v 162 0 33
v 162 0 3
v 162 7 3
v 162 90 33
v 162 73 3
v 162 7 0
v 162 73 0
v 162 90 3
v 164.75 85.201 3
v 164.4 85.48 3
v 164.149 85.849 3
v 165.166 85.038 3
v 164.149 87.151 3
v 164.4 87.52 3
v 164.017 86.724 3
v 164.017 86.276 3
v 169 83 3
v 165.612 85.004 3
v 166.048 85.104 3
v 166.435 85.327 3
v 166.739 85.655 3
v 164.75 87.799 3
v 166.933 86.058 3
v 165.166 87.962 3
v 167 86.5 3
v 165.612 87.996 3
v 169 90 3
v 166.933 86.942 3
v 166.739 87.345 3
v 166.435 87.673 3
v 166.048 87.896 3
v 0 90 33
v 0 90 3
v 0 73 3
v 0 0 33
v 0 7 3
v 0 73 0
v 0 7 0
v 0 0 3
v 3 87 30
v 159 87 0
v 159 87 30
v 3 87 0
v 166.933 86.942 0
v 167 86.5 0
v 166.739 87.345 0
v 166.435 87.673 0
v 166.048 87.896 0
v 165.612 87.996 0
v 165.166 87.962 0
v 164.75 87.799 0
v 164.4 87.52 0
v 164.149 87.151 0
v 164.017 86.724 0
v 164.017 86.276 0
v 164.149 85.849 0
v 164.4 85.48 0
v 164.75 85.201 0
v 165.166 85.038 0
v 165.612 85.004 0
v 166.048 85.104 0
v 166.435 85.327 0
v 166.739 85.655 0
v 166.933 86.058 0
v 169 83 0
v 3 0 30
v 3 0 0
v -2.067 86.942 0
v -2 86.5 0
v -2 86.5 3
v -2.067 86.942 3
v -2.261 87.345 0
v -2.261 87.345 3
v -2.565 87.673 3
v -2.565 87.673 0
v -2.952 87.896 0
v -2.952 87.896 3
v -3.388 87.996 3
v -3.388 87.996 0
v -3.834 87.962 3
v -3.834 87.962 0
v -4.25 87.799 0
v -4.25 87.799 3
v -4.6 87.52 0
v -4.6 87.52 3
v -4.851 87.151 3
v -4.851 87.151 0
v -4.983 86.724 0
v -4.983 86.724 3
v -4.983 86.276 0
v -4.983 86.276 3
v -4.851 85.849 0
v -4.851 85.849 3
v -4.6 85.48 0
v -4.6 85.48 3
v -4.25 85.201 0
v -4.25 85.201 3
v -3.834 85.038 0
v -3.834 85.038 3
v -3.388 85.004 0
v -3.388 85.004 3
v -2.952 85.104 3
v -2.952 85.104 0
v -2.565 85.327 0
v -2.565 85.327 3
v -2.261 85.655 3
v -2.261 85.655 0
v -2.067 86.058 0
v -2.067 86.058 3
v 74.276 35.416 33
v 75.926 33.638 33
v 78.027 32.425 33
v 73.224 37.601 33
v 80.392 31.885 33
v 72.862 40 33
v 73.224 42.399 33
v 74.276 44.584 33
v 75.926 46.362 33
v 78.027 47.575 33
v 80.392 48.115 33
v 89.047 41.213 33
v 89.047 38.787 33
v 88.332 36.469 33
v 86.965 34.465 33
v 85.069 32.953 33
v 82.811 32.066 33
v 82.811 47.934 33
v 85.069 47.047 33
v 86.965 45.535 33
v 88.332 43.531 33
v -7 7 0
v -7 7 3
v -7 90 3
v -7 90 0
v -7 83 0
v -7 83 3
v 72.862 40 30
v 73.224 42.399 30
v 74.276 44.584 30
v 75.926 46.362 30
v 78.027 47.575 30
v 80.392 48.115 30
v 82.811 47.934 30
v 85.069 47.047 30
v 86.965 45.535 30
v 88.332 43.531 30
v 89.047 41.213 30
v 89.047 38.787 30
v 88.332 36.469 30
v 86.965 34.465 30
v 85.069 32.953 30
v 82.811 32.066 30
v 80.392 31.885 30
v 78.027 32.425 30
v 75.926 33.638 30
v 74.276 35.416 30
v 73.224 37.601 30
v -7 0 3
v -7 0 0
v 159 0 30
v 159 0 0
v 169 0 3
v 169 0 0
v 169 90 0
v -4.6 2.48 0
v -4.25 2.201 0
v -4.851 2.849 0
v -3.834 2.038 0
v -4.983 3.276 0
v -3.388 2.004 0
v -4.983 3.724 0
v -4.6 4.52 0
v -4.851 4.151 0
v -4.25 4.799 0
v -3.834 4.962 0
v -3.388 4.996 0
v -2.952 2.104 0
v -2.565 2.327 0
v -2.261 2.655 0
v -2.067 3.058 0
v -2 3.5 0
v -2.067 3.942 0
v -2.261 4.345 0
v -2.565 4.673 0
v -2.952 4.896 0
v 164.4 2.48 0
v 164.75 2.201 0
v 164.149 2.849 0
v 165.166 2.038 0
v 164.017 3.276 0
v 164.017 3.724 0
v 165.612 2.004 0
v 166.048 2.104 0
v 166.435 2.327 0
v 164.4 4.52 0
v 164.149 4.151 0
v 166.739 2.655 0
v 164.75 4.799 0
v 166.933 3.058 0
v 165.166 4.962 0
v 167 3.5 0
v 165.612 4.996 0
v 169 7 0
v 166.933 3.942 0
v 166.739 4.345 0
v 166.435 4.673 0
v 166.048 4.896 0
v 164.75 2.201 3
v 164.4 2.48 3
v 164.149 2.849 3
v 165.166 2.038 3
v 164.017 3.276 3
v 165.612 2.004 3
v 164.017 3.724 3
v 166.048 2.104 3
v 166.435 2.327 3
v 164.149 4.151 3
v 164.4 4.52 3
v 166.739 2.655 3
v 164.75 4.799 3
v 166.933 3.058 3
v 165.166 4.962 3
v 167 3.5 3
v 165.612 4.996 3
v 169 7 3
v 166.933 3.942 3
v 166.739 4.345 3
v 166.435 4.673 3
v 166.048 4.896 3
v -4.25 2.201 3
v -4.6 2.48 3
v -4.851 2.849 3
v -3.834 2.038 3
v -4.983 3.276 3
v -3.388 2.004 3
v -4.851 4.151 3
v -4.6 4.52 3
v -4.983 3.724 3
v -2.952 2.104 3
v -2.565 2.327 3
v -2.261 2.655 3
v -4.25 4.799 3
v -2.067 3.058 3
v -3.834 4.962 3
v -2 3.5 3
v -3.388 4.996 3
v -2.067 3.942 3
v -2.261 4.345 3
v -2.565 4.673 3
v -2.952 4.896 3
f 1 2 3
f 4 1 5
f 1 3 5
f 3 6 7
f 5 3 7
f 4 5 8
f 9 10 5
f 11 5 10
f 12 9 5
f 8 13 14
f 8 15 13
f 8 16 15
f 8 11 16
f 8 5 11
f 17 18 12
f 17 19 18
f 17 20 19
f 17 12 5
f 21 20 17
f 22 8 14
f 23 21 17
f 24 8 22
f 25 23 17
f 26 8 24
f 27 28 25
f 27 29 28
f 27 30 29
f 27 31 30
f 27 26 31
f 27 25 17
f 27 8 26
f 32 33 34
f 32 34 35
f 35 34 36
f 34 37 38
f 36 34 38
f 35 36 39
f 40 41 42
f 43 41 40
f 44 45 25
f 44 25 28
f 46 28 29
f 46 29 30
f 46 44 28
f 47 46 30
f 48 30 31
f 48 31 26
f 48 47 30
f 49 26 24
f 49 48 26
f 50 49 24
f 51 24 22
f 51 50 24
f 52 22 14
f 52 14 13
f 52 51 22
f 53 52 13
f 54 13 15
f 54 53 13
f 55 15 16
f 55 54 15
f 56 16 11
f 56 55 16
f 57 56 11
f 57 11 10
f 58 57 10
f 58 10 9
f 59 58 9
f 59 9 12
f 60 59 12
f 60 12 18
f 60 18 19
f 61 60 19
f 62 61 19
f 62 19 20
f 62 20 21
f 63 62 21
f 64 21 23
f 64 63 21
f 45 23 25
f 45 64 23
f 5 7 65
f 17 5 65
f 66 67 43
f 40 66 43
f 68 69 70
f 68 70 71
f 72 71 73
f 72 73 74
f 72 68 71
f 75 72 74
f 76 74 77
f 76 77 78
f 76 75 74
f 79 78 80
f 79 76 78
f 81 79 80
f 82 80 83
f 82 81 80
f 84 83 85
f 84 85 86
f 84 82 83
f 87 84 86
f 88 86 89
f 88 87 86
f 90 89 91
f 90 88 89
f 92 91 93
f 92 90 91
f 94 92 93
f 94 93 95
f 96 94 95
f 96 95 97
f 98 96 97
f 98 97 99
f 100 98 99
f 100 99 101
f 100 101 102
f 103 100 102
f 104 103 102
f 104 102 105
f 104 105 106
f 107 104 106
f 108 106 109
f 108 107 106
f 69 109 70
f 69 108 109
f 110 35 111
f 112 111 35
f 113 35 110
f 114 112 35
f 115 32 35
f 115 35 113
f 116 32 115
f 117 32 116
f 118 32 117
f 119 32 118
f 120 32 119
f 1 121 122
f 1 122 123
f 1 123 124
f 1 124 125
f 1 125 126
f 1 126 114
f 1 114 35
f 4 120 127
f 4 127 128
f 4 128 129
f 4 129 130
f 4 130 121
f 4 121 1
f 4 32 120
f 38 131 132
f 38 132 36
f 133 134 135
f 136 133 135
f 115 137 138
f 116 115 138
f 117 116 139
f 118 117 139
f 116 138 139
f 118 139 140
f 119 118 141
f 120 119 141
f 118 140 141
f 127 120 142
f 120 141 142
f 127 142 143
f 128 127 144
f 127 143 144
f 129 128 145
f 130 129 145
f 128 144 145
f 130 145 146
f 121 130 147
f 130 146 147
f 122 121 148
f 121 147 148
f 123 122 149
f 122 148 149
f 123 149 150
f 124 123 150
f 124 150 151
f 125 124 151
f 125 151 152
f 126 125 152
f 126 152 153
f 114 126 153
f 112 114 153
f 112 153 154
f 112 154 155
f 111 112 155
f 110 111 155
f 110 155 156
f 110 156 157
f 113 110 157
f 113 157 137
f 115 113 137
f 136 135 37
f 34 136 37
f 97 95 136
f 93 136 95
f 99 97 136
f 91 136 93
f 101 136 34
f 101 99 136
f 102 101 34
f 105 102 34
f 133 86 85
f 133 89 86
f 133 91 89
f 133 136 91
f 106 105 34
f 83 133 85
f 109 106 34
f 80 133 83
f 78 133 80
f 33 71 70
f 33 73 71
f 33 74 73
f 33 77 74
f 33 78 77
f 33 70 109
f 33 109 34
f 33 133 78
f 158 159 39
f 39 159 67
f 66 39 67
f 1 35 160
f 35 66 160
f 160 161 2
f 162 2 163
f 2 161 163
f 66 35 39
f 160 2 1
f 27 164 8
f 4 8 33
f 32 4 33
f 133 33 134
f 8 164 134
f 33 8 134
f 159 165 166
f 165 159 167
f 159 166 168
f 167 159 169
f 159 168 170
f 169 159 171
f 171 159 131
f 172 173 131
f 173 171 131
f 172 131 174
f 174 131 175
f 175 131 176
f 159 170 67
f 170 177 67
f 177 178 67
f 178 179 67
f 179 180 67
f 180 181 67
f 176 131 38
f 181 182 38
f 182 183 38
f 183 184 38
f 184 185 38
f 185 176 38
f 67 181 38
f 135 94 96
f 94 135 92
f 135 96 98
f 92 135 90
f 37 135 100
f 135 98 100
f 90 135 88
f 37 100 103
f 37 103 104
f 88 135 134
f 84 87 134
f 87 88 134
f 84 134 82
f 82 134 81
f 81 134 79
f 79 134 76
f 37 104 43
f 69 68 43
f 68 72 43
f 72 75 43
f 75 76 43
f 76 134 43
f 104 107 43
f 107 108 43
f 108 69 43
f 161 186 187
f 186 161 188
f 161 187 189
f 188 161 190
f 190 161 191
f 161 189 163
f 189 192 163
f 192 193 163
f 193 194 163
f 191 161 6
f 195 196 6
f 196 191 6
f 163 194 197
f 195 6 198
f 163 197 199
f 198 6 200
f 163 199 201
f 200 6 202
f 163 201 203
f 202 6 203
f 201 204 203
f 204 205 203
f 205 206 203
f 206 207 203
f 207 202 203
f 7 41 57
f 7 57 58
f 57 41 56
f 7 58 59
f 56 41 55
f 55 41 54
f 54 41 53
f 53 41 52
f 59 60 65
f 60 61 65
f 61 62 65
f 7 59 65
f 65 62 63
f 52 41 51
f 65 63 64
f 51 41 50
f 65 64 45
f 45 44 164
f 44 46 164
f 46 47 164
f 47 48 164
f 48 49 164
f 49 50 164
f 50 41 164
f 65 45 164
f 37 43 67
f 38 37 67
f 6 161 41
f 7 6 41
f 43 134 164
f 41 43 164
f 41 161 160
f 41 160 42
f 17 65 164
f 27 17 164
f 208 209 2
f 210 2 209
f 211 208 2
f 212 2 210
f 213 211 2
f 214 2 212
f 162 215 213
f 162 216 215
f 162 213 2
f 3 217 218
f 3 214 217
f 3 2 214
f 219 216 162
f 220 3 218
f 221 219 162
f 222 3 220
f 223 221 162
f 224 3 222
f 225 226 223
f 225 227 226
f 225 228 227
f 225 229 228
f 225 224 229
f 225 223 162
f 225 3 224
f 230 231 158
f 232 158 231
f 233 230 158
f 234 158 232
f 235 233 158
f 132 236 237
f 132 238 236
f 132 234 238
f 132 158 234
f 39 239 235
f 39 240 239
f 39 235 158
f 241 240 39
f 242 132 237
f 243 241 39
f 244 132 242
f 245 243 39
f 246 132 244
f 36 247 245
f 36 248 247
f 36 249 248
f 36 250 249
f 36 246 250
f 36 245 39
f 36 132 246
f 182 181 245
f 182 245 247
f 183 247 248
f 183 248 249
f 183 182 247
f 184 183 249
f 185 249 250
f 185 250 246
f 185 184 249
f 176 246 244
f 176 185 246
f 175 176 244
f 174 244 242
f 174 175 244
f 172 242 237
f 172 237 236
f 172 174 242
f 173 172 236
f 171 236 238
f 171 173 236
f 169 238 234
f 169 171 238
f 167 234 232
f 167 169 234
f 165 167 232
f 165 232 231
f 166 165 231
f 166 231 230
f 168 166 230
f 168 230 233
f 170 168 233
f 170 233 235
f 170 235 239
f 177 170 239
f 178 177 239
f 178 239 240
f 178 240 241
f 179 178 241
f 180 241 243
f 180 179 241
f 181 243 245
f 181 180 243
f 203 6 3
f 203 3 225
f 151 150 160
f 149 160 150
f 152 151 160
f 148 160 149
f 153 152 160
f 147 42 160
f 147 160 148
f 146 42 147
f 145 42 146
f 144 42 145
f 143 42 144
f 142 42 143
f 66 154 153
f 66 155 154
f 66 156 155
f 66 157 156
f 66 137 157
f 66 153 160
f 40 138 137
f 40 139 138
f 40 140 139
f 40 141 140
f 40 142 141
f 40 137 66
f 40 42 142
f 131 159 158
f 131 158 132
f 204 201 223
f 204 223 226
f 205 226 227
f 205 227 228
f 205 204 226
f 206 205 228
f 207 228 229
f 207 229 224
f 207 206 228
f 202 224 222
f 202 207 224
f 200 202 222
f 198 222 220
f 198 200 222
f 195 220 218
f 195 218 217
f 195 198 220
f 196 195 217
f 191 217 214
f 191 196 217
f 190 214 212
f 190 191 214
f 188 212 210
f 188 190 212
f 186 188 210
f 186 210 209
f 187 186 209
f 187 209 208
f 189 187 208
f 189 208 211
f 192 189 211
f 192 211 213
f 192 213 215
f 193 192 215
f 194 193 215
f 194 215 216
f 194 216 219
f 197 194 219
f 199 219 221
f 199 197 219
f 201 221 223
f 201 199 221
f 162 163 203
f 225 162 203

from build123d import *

# Parameters (mm, degrees)
BOSS_EXTRUDE1_DEPTH = 33
SKETCH1_4_W         = 7
SKETCH1_4_H         = 7
SKETCH1_4_R         = 1.5
BOSS_EXTRUDE2_DEPTH = 3
SKETCH3_W           = 156
SKETCH3_H           = 87
SKETCH3_R           = 8.137703122
CUT_EXTRUDE1_DEPTH  = 30
SKETCH3_2_R         = 8.137703122
CUT_EXTRUDE2_DEPTH  = 33


with BuildPart() as part:
    # Sketch1 → Boss-Extrude1 (new body)
    with BuildSketch(Plane.XY):
        Polygon((0, 7), (0, 0), (162, 0), (162, 7), (162, 73), (162, 83), (162, 90), (0, 90), (0, 83), (0, 73), align=None)
    extrude(amount=BOSS_EXTRUDE1_DEPTH)

    # Sketch1<4> → Boss-Extrude2 (add)
    # profile 1 of 4: a face of its own
    with BuildSketch(Plane.XY):
        with Locations((-3.5, 3.5)):
            Rectangle(SKETCH1_4_W, SKETCH1_4_H)
        with Locations((-3.5, 3.5)):
            Circle(SKETCH1_4_R, mode=Mode.SUBTRACT)
    # profile 2 of 4: a face of its own
    with BuildSketch(Plane.XY):
        with Locations((165.5, 3.5)):
            Rectangle(SKETCH1_4_W, SKETCH1_4_H)
        with Locations((165.5, 3.5)):
            Circle(SKETCH1_4_R, mode=Mode.SUBTRACT)
    # profile 3 of 4: a face of its own
    with BuildSketch(Plane.XY):
        Polygon((-7, 83), (0, 73), (0, 90), (-7, 90), align=None)
        with Locations((-3.5, 86.5)):
            Circle(SKETCH1_4_R, mode=Mode.SUBTRACT)
    # profile 4 of 4: a face of its own
    with BuildSketch(Plane.XY):
        Polygon((162, 90), (162, 73), (169, 83), (169, 90), align=None)
        with Locations((165.5, 86.5)):
            Circle(SKETCH1_4_R, mode=Mode.SUBTRACT)
    extrude(amount=BOSS_EXTRUDE2_DEPTH)

    # Sketch3 → Cut-Extrude1 (cut)
    with BuildSketch(Plane(origin=(0, 0, 0), x_dir=(-1, 0, 0), z_dir=(0, 0, -1))):
        with Locations((-81, 43.5)):
            Rectangle(SKETCH3_W, SKETCH3_H)
        with Locations((-81, 40)):
            Circle(SKETCH3_R, mode=Mode.SUBTRACT)
    extrude(amount=-CUT_EXTRUDE1_DEPTH, mode=Mode.SUBTRACT)

    # Sketch3<2> → Cut-Extrude2 (cut)
    with BuildSketch(Plane(origin=(0, 0, 0), x_dir=(-1, 0, 0), z_dir=(0, 0, -1))):
        with Locations((-81, 40)):
            Circle(SKETCH3_2_R)
    extrude(amount=-CUT_EXTRUDE2_DEPTH, mode=Mode.SUBTRACT)


solid = part.part
